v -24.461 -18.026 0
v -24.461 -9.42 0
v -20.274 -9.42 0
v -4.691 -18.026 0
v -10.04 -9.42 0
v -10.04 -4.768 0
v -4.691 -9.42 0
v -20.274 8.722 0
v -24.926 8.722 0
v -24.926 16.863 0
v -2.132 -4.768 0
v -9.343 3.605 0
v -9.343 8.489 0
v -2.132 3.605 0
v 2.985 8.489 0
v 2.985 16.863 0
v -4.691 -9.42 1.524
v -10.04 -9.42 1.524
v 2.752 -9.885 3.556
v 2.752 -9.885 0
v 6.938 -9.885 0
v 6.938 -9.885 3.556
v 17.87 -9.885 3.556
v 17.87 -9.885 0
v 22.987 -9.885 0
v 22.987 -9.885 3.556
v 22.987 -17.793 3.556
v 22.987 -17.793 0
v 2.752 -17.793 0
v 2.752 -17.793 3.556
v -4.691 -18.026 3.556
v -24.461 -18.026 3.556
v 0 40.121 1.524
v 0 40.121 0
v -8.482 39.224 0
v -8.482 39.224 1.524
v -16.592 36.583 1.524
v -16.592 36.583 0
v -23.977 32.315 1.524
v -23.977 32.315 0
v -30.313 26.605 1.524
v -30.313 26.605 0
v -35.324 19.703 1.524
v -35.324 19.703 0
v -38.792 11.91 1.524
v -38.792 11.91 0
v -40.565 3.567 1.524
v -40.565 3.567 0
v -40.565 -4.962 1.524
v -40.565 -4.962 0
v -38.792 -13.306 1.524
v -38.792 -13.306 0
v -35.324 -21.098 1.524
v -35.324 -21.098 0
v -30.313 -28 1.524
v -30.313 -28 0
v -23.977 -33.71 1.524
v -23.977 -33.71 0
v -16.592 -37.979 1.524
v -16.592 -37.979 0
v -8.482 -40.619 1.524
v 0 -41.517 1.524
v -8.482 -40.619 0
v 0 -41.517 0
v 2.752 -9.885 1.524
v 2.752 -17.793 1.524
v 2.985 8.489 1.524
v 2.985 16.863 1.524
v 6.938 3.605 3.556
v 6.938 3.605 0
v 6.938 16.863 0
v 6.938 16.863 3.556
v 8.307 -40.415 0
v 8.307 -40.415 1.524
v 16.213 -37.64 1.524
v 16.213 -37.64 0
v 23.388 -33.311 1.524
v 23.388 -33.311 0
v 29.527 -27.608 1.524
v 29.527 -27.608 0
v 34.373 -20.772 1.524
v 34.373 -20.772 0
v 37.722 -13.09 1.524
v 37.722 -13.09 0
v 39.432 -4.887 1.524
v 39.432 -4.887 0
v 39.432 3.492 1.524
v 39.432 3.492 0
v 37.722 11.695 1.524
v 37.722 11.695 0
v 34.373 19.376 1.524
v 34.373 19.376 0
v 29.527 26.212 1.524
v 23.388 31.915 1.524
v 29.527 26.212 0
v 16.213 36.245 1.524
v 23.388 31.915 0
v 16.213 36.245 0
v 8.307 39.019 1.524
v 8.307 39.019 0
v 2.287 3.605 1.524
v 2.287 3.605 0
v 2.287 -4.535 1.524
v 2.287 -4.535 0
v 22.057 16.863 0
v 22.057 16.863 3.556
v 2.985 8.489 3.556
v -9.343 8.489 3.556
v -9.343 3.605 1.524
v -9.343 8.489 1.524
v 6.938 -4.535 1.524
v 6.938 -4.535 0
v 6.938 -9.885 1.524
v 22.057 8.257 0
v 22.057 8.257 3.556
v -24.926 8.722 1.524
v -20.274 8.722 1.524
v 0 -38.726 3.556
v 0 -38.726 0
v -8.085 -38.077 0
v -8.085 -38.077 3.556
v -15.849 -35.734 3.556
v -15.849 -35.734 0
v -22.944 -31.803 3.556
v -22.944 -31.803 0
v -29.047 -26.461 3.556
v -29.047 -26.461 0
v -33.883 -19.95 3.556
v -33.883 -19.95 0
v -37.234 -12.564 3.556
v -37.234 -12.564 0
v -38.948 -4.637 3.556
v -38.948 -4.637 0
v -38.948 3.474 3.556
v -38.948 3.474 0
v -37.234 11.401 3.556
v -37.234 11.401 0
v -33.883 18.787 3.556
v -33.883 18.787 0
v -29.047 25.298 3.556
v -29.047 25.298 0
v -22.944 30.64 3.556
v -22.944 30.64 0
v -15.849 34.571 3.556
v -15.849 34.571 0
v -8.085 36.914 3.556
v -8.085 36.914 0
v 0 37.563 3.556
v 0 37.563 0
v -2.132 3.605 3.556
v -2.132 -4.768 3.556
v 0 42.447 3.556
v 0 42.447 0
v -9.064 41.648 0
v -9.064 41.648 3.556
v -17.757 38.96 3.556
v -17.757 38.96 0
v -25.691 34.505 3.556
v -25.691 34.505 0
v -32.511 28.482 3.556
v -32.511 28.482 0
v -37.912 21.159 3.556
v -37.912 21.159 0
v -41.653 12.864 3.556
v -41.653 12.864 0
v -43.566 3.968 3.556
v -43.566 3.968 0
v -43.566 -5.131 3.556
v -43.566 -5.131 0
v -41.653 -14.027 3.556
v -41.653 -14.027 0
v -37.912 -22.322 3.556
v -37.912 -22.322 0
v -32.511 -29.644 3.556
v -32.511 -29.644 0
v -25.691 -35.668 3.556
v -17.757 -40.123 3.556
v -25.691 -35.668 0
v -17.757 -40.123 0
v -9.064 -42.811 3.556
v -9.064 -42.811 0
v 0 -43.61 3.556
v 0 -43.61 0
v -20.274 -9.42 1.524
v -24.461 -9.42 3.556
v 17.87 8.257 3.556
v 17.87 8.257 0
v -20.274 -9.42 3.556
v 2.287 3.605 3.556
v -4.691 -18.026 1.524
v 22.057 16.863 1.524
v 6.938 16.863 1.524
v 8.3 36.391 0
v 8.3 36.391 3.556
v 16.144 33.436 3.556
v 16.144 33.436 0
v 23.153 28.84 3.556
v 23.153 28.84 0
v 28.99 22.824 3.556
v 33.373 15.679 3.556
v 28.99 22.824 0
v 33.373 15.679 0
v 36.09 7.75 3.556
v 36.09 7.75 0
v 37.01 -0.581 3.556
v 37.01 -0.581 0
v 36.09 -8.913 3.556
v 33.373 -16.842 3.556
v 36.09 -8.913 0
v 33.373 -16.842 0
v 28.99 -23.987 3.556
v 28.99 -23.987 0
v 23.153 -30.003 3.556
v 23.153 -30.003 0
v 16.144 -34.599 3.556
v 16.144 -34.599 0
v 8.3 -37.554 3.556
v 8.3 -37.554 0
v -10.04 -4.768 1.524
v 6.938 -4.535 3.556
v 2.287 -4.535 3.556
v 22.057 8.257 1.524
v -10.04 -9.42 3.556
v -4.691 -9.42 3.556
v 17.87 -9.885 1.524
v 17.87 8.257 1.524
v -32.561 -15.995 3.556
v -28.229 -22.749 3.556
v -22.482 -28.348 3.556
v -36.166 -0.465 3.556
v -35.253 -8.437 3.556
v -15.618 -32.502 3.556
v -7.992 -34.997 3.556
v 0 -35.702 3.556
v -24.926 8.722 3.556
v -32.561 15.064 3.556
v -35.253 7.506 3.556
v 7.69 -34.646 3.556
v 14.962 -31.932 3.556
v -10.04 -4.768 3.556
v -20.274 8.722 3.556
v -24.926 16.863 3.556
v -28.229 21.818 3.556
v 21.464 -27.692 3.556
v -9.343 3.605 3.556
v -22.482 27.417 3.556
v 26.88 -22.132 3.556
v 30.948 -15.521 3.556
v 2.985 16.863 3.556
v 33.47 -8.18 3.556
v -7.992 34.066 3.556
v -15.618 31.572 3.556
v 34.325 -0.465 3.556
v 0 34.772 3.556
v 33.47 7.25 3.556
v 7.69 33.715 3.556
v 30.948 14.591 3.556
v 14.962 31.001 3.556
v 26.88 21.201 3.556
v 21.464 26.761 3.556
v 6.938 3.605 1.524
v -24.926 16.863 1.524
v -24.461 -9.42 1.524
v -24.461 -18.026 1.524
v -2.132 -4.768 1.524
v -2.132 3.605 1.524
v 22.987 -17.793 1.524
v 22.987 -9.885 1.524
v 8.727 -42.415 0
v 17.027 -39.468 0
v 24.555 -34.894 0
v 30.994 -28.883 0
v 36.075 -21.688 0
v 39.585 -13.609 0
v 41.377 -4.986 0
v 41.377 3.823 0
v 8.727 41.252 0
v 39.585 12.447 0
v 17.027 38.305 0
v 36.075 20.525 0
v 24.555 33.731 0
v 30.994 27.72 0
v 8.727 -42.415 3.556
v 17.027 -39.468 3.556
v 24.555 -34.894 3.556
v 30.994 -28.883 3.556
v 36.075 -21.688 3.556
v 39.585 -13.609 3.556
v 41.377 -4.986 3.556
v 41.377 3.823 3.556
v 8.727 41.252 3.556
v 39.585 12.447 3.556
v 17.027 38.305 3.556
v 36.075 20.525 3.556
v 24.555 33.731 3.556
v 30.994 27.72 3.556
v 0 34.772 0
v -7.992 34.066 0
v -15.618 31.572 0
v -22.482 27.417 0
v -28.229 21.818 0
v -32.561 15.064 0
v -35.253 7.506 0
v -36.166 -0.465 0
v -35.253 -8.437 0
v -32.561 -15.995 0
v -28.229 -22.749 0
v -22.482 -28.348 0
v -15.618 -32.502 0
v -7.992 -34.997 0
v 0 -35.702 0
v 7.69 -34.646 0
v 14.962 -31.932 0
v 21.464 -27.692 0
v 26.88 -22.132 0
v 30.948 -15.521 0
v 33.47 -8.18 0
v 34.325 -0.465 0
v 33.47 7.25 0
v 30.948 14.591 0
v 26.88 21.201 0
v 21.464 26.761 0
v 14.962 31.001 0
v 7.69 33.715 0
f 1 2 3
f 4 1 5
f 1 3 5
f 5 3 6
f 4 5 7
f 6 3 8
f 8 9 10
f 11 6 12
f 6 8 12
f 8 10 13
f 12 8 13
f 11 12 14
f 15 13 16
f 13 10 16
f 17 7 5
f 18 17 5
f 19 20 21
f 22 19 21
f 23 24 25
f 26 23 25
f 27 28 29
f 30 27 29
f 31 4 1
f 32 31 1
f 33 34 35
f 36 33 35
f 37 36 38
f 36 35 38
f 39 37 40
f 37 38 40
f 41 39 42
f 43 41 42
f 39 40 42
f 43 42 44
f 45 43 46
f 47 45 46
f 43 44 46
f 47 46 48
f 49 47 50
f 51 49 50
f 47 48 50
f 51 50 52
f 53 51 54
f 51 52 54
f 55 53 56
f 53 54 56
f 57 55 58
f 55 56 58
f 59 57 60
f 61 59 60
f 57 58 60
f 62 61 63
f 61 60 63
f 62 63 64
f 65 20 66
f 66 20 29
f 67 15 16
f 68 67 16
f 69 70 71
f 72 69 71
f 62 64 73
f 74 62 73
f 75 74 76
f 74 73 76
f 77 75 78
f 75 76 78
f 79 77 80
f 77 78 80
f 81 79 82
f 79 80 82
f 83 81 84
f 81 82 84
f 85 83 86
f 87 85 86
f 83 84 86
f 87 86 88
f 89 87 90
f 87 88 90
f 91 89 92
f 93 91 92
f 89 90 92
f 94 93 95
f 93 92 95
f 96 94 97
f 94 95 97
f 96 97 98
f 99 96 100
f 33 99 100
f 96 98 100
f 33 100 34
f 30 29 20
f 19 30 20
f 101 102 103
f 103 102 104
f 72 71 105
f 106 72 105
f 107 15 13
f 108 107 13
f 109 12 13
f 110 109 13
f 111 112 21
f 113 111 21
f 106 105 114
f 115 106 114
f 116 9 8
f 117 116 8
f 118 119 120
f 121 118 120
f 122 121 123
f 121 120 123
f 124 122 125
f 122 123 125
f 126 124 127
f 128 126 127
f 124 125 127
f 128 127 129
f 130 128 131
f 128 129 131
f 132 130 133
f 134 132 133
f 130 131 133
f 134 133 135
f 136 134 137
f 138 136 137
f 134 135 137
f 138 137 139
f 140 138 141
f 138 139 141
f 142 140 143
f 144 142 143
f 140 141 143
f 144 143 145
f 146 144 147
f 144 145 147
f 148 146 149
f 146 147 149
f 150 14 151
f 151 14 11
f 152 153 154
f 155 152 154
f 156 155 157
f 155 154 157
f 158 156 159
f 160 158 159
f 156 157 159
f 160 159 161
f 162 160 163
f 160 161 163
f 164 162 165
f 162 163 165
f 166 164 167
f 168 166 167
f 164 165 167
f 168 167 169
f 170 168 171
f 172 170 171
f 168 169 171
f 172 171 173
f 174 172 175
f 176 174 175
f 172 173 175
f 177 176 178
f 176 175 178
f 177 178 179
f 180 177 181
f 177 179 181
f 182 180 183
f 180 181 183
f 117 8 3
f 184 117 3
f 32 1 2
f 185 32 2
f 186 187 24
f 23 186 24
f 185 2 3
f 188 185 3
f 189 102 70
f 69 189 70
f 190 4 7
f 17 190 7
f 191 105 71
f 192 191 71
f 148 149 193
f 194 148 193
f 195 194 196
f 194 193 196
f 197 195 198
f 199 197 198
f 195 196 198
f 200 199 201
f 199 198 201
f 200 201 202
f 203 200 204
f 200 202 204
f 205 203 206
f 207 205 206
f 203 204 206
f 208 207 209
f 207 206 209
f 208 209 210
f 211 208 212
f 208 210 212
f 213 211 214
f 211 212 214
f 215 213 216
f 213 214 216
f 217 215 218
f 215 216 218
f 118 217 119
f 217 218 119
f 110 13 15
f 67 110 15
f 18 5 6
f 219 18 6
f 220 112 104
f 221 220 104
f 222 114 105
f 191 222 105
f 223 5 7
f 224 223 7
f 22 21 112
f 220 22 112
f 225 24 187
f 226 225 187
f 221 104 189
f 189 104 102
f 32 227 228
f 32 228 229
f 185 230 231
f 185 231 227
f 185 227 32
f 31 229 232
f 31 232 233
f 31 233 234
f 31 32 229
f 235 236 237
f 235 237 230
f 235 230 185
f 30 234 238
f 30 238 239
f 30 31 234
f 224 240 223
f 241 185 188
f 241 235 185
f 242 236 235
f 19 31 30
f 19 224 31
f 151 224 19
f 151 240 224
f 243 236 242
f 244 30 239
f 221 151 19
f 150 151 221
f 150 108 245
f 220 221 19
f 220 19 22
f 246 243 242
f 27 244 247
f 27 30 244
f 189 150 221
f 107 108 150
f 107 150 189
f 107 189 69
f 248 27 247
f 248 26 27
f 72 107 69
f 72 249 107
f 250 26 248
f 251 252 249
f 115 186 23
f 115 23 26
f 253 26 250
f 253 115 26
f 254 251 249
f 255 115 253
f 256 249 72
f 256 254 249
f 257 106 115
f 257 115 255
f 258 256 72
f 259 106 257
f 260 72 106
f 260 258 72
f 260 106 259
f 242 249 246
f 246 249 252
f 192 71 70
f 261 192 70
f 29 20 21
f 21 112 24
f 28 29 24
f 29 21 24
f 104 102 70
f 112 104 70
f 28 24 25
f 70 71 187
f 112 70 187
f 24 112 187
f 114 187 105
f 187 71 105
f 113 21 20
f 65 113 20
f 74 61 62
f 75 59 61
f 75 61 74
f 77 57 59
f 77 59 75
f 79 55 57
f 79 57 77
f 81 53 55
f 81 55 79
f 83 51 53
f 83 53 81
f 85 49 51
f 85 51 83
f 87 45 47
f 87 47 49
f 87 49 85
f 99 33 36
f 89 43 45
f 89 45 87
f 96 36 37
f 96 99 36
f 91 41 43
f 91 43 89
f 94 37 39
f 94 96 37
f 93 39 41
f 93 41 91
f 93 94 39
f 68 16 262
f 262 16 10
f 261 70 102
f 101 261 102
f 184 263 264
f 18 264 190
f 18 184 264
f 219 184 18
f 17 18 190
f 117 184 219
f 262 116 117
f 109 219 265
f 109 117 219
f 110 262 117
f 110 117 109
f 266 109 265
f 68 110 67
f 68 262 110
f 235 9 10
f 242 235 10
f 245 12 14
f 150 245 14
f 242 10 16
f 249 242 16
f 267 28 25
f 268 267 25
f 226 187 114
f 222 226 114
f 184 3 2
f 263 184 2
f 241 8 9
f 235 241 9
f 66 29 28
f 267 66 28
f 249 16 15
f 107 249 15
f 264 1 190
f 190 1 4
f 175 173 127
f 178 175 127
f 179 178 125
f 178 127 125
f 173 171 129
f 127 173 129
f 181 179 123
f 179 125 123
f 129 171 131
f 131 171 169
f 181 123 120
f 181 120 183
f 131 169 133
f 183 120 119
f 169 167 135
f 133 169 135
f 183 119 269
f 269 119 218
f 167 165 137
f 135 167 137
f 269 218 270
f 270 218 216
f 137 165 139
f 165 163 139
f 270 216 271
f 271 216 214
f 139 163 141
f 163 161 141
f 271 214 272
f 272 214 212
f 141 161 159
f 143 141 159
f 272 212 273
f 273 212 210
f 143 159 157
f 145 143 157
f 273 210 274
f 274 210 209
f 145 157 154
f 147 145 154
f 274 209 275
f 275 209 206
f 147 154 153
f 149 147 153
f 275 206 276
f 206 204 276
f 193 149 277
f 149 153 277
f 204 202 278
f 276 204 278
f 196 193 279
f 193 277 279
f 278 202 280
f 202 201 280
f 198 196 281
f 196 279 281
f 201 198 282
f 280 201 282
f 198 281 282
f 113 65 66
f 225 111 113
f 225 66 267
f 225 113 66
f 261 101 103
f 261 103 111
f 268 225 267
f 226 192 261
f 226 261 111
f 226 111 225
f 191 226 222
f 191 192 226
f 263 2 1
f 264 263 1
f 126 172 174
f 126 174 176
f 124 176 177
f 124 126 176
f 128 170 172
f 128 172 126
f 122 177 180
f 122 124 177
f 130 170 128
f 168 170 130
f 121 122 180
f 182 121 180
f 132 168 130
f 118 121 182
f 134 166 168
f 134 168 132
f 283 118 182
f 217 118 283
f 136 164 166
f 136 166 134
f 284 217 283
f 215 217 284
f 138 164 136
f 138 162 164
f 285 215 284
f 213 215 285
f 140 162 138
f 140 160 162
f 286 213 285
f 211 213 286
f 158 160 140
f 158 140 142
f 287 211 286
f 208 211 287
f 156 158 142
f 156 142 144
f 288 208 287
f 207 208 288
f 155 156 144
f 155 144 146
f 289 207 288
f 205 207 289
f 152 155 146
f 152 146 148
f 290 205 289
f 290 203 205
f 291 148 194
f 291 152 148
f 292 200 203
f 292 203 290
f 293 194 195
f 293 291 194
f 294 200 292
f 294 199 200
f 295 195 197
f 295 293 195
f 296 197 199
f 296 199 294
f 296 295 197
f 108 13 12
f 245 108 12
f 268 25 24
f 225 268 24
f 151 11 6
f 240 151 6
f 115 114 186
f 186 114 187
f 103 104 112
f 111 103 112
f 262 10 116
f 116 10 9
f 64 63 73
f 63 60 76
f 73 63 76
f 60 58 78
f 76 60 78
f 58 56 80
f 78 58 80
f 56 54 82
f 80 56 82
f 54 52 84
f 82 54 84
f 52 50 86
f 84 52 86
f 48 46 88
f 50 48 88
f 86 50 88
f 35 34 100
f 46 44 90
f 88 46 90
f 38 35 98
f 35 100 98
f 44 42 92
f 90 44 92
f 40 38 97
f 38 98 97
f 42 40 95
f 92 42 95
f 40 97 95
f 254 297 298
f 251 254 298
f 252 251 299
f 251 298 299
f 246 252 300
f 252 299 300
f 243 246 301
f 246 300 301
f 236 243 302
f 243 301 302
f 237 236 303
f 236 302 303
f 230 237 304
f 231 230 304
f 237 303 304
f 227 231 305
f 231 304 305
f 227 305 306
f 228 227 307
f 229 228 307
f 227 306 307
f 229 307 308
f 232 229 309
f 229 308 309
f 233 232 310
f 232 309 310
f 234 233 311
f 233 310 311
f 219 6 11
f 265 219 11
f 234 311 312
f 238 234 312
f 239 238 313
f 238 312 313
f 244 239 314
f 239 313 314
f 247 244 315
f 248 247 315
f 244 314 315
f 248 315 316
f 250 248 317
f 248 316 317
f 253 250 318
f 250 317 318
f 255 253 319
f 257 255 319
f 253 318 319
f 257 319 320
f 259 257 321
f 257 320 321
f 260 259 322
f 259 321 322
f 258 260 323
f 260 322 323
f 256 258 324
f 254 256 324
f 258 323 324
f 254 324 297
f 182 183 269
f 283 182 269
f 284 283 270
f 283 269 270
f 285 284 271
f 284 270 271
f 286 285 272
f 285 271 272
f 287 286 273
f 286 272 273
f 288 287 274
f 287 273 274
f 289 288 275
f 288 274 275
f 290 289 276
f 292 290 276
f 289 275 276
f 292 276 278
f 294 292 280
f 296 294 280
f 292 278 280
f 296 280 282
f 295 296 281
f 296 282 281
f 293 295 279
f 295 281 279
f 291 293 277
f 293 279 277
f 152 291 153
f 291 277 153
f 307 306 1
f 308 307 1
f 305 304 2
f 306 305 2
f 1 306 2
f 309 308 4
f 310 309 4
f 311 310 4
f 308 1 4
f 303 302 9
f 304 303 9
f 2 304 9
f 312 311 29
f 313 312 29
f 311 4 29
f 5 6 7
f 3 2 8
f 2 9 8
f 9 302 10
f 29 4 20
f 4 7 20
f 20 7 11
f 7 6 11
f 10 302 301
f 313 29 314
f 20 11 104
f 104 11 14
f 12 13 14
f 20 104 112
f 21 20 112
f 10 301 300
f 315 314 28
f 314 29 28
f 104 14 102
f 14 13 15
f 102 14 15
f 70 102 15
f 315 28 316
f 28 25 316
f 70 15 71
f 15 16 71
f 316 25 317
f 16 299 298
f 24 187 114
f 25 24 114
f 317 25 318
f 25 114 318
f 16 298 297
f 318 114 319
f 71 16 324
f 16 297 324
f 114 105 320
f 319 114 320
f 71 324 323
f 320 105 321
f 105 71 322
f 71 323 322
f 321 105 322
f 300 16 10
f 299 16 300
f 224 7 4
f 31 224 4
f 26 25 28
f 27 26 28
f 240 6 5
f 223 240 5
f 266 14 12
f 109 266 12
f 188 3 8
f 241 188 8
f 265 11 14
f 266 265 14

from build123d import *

# Parameters (mm, degrees)
F1_DEPTH = 3.556
F2_DEPTH = 3.556
F3_DEPTH = 1.524
F5_DEPTH = 1.524


with BuildPart() as f1:
    # F0 (on Top) → F1 (new body)
    with BuildSketch(Plane.XY):
        with BuildLine():
            ThreePointArc((0, -35.702139), (34.325082, -0.465175), (0, 34.771789))
            ThreePointArc((0, 34.771789), (-36.16613, -0.465175), (0, -35.702139))
        make_face()
        Polygon((-24.92596, 8.72202), (-24.92596, 16.862573), (2.984505, 16.862573), (2.984505, 8.489433), (-9.342617, 8.489433), (-9.342617, 3.605102), (-2.132414, 3.605102), (-2.132414, -4.768038), (-10.040379, -4.768038), (-10.040379, -9.419782), (-4.690873, -9.419782), (-4.690873, -18.02551), (-24.460785, -18.02551), (-24.460785, -9.419782), (-20.274216, -9.419782), (-20.274216, 8.72202), align=None, mode=Mode.SUBTRACT)
        Polygon((6.938491, 3.605102), (6.938491, 16.862577), (22.056657, 16.862577), (22.056657, 8.256846), (17.870085, 8.256846), (17.870085, -9.884956), (22.987004, -9.884956), (22.987004, -17.792922), (2.751917, -17.792922), (2.751917, -9.884956), (6.938491, -9.884956), (6.938491, -4.535451), (2.286744, -4.535451), (2.286744, 3.605102), align=None, mode=Mode.SUBTRACT)
        with BuildLine():
            ThreePointArc((0, -43.610103), (41.60335, -0.581469), (0, 42.447165))
            ThreePointArc((0, 42.447165), (-43.807111, -0.581469), (0, -43.610103))
        make_face()
        with BuildLine():
            ThreePointArc((0, -38.725771), (-39.164171, -0.581469), (0, 37.562832))
            ThreePointArc((0, 37.562832), (37.010273, -0.581469), (0, -38.725771))
        make_face(mode=Mode.SUBTRACT)
    extrude(amount=F1_DEPTH)


with BuildPart() as f2:
    # F0 (on Top) → F2 (new body)
    with BuildSketch(Plane.XY):
        with BuildLine():
            ThreePointArc((0, -35.702139), (34.325082, -0.465175), (0, 34.771789))
            ThreePointArc((0, 34.771789), (-36.16613, -0.465175), (0, -35.702139))
        make_face()
        Polygon((-24.92596, 8.72202), (-24.92596, 16.862573), (2.984505, 16.862573), (2.984505, 8.489433), (-9.342617, 8.489433), (-9.342617, 3.605102), (-2.132414, 3.605102), (-2.132414, -4.768038), (-10.040379, -4.768038), (-10.040379, -9.419782), (-4.690873, -9.419782), (-4.690873, -18.02551), (-24.460785, -18.02551), (-24.460785, -9.419782), (-20.274216, -9.419782), (-20.274216, 8.72202), align=None, mode=Mode.SUBTRACT)
        Polygon((6.938491, 3.605102), (6.938491, 16.862577), (22.056657, 16.862577), (22.056657, 8.256846), (17.870085, 8.256846), (17.870085, -9.884956), (22.987004, -9.884956), (22.987004, -17.792922), (2.751917, -17.792922), (2.751917, -9.884956), (6.938491, -9.884956), (6.938491, -4.535451), (2.286744, -4.535451), (2.286744, 3.605102), align=None, mode=Mode.SUBTRACT)
    extrude(amount=F2_DEPTH)


with BuildPart() as f3:
    # F0 (on Top) → F3 (new body)
    with BuildSketch(Plane.XY):
        Polygon((2.984505, 16.862573), (-24.92596, 16.862573), (-24.92596, 8.72202), (-20.274216, 8.72202), (-20.274216, -9.419782), (-24.460785, -9.419782), (-24.460785, -18.02551), (-4.690873, -18.02551), (-4.690873, -9.419782), (-10.040379, -9.419782), (-10.040379, -4.768038), (-2.132414, -4.768038), (-2.132414, 3.605102), (-9.342617, 3.605102), (-9.342617, 8.489433), (2.984505, 8.489433), align=None)
        Polygon((22.056657, 16.862577), (6.938491, 16.862577), (6.938491, 3.605102), (2.286744, 3.605102), (2.286744, -4.535451), (6.938491, -4.535451), (6.938491, -9.884956), (2.751917, -9.884956), (2.751917, -17.792922), (22.987004, -17.792922), (22.987004, -9.884956), (17.870085, -9.884956), (17.870085, 8.256846), (22.056657, 8.256846), align=None)
    extrude(amount=F3_DEPTH)


with BuildPart() as f5:
    # F4 (on Top) → F5 (new body)
    with BuildSketch(Plane.XY):
        with BuildLine():
            ThreePointArc((0, -41.516814), (39.647375, -0.697762), (0, 40.121291))
            ThreePointArc((0, 40.121291), (-40.788039, -0.697762), (0, -41.516814))
        make_face()
    extrude(amount=F5_DEPTH)


solid = Compound([f1.part, f2.part, f3.part, f5.part])
